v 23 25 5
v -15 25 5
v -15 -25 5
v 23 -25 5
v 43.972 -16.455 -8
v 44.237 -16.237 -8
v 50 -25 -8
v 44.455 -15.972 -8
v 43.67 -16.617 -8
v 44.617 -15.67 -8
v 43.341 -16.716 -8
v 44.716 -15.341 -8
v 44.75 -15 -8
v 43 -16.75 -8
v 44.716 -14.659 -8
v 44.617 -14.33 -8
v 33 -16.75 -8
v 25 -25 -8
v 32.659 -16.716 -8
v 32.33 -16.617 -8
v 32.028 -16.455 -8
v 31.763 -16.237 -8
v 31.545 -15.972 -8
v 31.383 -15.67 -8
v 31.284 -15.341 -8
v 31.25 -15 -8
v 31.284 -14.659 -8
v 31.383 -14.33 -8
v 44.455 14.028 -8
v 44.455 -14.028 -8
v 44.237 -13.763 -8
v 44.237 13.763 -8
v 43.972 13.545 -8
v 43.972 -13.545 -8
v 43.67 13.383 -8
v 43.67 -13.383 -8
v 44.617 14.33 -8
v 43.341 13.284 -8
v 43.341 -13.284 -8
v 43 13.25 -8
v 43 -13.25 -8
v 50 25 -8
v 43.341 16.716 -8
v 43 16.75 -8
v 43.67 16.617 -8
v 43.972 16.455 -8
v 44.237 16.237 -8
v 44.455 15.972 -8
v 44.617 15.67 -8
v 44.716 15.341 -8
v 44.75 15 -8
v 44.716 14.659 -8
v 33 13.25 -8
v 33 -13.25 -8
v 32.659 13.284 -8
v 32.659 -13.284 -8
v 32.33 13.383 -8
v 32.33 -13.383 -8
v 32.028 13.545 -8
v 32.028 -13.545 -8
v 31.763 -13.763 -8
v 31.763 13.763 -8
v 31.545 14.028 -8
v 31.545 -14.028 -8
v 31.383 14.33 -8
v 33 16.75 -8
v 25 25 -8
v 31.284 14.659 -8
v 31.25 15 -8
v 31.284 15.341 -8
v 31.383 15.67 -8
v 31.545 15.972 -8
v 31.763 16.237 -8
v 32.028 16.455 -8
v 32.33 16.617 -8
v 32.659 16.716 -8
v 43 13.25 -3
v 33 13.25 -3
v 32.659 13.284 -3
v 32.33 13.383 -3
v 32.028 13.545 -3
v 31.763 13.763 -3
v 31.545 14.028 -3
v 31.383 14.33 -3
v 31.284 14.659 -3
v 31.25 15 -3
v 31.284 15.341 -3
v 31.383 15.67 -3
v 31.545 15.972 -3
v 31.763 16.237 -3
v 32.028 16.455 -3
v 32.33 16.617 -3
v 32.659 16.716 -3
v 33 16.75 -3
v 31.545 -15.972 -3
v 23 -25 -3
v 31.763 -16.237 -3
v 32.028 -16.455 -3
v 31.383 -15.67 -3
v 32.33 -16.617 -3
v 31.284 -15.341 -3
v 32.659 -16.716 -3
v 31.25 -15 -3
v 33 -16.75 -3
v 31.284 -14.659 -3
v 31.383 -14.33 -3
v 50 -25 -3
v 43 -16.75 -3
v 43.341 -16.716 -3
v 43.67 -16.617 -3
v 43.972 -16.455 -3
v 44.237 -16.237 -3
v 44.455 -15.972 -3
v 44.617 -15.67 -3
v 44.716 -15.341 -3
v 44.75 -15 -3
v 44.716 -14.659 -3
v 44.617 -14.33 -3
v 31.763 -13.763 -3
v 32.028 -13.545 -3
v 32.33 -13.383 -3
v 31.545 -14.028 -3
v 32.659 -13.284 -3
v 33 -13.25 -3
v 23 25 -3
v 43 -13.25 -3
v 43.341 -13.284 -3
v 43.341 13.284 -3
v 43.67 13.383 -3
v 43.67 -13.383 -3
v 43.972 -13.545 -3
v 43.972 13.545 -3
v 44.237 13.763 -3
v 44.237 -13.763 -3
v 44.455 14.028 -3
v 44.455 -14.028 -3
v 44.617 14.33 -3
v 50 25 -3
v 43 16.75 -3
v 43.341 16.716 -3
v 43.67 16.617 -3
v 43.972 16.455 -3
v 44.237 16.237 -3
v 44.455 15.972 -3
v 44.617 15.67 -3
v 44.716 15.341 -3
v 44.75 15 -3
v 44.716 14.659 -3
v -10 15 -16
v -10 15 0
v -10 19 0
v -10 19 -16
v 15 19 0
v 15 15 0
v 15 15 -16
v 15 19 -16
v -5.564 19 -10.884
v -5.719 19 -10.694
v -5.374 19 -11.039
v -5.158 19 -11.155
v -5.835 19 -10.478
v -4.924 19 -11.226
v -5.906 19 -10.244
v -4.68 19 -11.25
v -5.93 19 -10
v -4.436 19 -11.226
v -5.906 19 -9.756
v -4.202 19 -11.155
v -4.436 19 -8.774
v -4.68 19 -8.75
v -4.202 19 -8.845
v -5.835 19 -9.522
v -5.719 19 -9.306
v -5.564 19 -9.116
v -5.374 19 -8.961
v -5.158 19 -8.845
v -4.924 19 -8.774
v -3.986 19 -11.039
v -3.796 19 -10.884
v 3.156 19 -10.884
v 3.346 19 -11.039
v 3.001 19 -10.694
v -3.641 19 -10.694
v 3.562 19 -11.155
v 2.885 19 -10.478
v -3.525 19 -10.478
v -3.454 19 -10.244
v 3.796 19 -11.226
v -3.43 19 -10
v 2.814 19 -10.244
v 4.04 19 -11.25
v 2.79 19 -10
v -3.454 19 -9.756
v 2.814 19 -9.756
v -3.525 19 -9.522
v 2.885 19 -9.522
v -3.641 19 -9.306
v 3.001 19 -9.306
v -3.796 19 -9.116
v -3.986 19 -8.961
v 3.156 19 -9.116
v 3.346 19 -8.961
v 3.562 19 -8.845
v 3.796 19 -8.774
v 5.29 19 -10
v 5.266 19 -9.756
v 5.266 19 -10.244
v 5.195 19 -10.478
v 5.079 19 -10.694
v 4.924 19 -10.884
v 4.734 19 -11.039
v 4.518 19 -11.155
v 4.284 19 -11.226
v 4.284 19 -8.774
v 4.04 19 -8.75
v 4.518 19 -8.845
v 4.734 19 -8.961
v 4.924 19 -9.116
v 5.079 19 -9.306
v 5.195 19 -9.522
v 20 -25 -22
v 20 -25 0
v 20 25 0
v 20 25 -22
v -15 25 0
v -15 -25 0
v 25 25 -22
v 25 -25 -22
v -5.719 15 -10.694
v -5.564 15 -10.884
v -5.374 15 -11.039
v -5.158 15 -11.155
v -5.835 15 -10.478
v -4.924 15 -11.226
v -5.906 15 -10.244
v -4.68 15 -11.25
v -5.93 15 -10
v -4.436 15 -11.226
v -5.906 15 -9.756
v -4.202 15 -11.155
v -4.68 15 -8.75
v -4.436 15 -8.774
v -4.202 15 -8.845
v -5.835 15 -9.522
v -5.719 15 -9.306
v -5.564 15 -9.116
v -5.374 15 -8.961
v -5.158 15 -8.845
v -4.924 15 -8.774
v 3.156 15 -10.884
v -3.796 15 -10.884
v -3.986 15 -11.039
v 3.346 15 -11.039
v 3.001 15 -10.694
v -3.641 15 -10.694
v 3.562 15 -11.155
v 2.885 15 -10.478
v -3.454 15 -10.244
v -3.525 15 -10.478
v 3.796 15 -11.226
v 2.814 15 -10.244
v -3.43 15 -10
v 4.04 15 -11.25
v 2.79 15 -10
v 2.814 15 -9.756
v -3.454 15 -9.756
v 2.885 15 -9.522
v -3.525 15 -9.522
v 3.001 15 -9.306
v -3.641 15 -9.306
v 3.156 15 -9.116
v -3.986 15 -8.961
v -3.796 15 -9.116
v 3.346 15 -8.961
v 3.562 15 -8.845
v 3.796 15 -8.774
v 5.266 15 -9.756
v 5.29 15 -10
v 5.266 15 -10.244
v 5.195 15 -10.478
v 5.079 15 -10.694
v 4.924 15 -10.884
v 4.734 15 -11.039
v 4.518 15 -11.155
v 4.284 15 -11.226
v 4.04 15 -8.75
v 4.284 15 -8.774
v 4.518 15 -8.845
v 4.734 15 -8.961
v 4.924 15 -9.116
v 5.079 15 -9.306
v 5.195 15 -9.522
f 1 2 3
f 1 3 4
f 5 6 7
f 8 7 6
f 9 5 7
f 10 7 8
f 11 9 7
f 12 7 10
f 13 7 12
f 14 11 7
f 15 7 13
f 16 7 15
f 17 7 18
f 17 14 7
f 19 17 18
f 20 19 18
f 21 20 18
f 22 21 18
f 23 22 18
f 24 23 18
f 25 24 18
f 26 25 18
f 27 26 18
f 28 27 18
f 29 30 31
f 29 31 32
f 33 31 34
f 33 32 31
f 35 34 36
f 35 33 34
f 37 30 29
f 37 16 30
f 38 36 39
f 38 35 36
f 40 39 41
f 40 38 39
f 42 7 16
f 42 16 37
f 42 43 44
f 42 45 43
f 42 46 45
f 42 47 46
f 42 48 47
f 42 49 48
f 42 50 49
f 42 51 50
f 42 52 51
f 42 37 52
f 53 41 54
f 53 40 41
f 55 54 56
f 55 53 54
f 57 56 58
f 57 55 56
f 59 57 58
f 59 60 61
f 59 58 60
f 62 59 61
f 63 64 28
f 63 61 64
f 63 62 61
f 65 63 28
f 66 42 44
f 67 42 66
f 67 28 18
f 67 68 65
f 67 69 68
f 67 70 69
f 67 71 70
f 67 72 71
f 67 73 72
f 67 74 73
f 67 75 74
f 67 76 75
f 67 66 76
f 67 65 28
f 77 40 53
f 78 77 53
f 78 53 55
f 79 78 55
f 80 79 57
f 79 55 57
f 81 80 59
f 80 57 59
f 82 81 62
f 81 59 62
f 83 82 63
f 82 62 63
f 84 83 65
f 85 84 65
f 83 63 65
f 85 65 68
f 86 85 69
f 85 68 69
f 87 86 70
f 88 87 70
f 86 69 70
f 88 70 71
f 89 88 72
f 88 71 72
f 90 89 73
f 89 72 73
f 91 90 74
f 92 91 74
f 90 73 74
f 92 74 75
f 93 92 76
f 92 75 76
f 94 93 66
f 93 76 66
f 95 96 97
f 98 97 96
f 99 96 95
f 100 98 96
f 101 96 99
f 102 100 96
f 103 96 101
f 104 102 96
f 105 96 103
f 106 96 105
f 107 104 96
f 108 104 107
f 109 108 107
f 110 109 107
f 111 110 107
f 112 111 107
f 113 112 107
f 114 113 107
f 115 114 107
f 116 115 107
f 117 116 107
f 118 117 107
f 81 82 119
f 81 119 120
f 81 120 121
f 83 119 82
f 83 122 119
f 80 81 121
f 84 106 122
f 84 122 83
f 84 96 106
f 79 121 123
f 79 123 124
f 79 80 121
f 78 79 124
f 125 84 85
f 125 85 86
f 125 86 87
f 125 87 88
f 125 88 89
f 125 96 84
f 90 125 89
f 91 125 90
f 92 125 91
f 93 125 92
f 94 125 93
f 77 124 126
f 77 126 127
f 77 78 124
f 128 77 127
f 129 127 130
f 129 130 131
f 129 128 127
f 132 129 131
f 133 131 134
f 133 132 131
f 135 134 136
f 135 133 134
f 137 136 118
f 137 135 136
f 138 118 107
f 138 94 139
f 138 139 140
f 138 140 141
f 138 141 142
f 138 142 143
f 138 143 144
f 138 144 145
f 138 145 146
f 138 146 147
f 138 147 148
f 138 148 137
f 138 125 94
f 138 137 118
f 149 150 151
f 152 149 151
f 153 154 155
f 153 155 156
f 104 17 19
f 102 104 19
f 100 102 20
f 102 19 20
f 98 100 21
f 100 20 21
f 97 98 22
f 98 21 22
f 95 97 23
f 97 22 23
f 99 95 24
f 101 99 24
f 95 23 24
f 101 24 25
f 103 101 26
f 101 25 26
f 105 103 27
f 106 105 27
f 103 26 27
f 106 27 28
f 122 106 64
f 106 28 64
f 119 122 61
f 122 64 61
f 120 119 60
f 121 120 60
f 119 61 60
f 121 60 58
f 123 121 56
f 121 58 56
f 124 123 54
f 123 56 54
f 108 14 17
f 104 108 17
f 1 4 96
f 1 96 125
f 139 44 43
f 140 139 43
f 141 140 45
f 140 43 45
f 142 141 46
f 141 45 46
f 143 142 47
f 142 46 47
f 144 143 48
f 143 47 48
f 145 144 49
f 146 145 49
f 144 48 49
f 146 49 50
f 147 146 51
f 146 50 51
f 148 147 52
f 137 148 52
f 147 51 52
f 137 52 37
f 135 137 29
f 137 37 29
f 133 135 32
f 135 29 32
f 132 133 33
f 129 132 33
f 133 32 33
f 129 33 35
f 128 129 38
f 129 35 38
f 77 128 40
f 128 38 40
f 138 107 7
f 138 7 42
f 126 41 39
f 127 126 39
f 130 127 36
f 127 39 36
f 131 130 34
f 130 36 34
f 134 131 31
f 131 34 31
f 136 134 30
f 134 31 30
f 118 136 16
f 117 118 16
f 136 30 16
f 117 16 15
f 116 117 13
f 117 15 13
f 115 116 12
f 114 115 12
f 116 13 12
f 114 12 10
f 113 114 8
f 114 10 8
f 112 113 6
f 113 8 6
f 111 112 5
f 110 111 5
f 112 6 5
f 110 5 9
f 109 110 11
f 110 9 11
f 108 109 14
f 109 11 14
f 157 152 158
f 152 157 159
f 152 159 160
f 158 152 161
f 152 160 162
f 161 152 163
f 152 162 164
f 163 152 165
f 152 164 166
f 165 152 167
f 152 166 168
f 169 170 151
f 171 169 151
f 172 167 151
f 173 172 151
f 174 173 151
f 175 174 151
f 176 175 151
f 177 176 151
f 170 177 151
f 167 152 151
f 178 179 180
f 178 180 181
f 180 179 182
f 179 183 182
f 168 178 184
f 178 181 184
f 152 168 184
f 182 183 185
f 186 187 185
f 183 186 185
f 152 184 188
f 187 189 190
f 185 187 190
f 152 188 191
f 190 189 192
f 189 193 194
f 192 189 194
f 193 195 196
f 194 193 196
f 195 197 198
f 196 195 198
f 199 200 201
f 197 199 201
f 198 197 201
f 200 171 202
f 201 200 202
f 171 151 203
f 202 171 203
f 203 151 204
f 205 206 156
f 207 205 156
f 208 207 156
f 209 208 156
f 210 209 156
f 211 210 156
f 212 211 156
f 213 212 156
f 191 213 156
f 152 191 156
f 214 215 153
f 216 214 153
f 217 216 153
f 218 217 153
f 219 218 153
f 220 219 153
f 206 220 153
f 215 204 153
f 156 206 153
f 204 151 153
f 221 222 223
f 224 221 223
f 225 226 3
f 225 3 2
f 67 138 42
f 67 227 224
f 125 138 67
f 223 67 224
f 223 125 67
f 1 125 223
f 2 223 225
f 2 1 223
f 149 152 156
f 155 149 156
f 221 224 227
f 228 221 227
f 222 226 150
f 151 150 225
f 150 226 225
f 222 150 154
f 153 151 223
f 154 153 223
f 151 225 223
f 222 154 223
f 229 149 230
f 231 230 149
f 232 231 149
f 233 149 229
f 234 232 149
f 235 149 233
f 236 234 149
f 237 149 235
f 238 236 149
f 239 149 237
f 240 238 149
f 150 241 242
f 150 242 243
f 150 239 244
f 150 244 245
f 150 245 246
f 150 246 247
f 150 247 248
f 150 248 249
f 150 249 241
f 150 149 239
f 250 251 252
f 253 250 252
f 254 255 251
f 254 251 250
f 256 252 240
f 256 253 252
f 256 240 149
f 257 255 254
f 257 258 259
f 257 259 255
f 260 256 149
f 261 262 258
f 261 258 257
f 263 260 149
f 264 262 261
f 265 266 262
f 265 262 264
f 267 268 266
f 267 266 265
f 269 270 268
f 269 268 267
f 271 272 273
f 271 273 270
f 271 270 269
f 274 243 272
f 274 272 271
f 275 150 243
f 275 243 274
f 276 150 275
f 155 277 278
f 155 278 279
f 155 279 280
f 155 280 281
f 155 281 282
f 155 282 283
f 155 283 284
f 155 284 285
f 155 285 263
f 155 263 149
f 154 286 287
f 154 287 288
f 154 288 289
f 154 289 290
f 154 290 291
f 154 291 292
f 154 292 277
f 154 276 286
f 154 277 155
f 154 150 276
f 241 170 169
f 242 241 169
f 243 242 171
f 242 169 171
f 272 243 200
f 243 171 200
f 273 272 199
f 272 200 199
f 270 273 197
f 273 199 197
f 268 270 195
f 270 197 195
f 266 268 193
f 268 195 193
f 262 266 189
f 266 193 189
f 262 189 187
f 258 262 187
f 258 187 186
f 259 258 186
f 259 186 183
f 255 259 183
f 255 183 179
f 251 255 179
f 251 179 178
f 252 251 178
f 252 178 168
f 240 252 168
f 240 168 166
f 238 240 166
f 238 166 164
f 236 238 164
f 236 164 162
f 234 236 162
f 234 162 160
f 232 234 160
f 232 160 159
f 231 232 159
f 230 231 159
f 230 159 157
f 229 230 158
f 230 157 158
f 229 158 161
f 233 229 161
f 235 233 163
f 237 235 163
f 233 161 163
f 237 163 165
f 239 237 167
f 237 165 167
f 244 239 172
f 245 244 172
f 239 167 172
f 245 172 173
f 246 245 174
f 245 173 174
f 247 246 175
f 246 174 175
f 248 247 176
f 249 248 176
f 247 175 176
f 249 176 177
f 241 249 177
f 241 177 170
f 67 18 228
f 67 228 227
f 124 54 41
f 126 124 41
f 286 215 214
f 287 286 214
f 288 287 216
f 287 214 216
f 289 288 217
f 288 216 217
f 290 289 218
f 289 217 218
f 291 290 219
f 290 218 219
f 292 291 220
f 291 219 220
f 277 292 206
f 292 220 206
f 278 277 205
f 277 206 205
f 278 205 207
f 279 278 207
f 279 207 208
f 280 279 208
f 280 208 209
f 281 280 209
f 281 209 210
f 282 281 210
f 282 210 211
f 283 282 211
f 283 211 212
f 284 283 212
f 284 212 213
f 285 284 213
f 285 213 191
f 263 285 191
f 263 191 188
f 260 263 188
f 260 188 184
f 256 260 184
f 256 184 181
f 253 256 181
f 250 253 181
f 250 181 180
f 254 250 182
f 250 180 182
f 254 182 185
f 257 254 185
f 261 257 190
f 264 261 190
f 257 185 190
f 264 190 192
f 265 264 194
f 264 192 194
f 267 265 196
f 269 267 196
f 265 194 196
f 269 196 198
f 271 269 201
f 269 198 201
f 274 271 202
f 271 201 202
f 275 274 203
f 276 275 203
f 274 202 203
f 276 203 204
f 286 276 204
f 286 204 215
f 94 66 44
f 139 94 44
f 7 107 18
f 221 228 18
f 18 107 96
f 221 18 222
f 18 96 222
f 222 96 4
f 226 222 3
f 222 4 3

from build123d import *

# Parameters (mm, degrees)
SKETCH1_W                       = 100
SKETCH1_H                       = 50
BOSS_EXTRUDE1_DEPTH             = 5
SKETCH2_W                       = 5
SKETCH2_H                       = 50
BOSS_EXTRUDE2_DEPTH             = 22
SKETCH5_W                       = 25
SKETCH5_H                       = 4
BOSS_EXTRUDE3_DEPTH             = 16
SKETCH6_R                       = 1.25
HOLES_TO_FIX_LEVEL_SWITCH_DEPTH = 40
SKETCH10_W                      = 25
SKETCH10_H                      = 50
BOSS_EXTRUDE4_DEPTH             = 8
CUT_EXTRUDE2_DEPTH              = 61.074953184
CUT_EXTRUDE2_DEPTH_BACK         = 61.074953184
SKETCH9_W                       = 35
SKETCH9_H                       = 50
CUT_EXTRUDE3_DEPTH              = 10
SKETCH11_W                      = 27
SKETCH11_H                      = 50
CUT_EXTRUDE4_DEPTH              = 8


with BuildPart() as part:
    # Sketch1 → Boss-Extrude1 (new body)
    with BuildSketch(Plane.XY):
        Rectangle(SKETCH1_W, SKETCH1_H)
    extrude(amount=BOSS_EXTRUDE1_DEPTH)

    # Sketch2 → Boss-Extrude2 (add)
    with BuildSketch(Plane.XY):
        with Locations((22.5, 0)):
            Rectangle(SKETCH2_W, SKETCH2_H)
    extrude(amount=-BOSS_EXTRUDE2_DEPTH)

    # Sketch5 → Boss-Extrude3 (add)
    with BuildSketch(Plane.XY):
        with Locations((2.5, 17)):
            Rectangle(SKETCH5_W, SKETCH5_H)
    extrude(amount=-BOSS_EXTRUDE3_DEPTH)

    # Sketch6 → Holes-to-fix-level-switch (cut)
    with BuildSketch(Plane(origin=(0, 19, 0), x_dir=(1, 0, 0), z_dir=(0, 1, 0))):
        with Locations(Location((-4.68, 10, 0), (0, 0, 270))):
            Circle(SKETCH6_R)
        with Locations(Location((4.04, 10, 0), (0, 0, 270))):
            Circle(SKETCH6_R)
    extrude(amount=-HOLES_TO_FIX_LEVEL_SWITCH_DEPTH, mode=Mode.SUBTRACT)

    # Sketch10 → Boss-Extrude4 (add)
    with BuildSketch(Plane(origin=(0, 0, 0), x_dir=(-1, 0, 0), z_dir=(0, 0, -1))):
        with Locations((-37.5, 0)):
            Rectangle(SKETCH10_W, SKETCH10_H)
    extrude(amount=BOSS_EXTRUDE4_DEPTH)

    # Sketch8 → Cut-Extrude2 (cut, two sides: drawn at the far end of the back side and taken through both)
    with BuildSketch(Plane.XY.offset(-CUT_EXTRUDE2_DEPTH_BACK)):
        with BuildLine():
            Line((33, 16.75), (43, 16.75))
            ThreePointArc((43, 16.75), (44.75, 15), (43, 13.25))
            Line((43, 13.25), (33, 13.25))
            ThreePointArc((33, 13.25), (31.25, 15), (33, 16.75))
        make_face()
        with BuildLine():
            Line((33, -13.25), (43, -13.25))
            ThreePointArc((43, -13.25), (44.75, -15), (43, -16.75))
            Line((43, -16.75), (33, -16.75))
            ThreePointArc((33, -16.75), (31.25, -15), (33, -13.25))
        make_face()
    extrude(amount=CUT_EXTRUDE2_DEPTH + CUT_EXTRUDE2_DEPTH_BACK, mode=Mode.SUBTRACT)

    # Sketch9 → Cut-Extrude3 (cut)
    with BuildSketch(Plane(origin=(0, 0, 0), x_dir=(-1, 0, 0), z_dir=(0, 0, -1))):
        with Locations((32.5, 0)):
            Rectangle(SKETCH9_W, SKETCH9_H)
    extrude(amount=-CUT_EXTRUDE3_DEPTH, mode=Mode.SUBTRACT)

    # Sketch11 → Cut-Extrude4 (cut)
    with BuildSketch(Plane.XY.offset(5)):
        with Locations((36.5, 0)):
            Rectangle(SKETCH11_W, SKETCH11_H)
    extrude(amount=-CUT_EXTRUDE4_DEPTH, mode=Mode.SUBTRACT)


solid = part.part
